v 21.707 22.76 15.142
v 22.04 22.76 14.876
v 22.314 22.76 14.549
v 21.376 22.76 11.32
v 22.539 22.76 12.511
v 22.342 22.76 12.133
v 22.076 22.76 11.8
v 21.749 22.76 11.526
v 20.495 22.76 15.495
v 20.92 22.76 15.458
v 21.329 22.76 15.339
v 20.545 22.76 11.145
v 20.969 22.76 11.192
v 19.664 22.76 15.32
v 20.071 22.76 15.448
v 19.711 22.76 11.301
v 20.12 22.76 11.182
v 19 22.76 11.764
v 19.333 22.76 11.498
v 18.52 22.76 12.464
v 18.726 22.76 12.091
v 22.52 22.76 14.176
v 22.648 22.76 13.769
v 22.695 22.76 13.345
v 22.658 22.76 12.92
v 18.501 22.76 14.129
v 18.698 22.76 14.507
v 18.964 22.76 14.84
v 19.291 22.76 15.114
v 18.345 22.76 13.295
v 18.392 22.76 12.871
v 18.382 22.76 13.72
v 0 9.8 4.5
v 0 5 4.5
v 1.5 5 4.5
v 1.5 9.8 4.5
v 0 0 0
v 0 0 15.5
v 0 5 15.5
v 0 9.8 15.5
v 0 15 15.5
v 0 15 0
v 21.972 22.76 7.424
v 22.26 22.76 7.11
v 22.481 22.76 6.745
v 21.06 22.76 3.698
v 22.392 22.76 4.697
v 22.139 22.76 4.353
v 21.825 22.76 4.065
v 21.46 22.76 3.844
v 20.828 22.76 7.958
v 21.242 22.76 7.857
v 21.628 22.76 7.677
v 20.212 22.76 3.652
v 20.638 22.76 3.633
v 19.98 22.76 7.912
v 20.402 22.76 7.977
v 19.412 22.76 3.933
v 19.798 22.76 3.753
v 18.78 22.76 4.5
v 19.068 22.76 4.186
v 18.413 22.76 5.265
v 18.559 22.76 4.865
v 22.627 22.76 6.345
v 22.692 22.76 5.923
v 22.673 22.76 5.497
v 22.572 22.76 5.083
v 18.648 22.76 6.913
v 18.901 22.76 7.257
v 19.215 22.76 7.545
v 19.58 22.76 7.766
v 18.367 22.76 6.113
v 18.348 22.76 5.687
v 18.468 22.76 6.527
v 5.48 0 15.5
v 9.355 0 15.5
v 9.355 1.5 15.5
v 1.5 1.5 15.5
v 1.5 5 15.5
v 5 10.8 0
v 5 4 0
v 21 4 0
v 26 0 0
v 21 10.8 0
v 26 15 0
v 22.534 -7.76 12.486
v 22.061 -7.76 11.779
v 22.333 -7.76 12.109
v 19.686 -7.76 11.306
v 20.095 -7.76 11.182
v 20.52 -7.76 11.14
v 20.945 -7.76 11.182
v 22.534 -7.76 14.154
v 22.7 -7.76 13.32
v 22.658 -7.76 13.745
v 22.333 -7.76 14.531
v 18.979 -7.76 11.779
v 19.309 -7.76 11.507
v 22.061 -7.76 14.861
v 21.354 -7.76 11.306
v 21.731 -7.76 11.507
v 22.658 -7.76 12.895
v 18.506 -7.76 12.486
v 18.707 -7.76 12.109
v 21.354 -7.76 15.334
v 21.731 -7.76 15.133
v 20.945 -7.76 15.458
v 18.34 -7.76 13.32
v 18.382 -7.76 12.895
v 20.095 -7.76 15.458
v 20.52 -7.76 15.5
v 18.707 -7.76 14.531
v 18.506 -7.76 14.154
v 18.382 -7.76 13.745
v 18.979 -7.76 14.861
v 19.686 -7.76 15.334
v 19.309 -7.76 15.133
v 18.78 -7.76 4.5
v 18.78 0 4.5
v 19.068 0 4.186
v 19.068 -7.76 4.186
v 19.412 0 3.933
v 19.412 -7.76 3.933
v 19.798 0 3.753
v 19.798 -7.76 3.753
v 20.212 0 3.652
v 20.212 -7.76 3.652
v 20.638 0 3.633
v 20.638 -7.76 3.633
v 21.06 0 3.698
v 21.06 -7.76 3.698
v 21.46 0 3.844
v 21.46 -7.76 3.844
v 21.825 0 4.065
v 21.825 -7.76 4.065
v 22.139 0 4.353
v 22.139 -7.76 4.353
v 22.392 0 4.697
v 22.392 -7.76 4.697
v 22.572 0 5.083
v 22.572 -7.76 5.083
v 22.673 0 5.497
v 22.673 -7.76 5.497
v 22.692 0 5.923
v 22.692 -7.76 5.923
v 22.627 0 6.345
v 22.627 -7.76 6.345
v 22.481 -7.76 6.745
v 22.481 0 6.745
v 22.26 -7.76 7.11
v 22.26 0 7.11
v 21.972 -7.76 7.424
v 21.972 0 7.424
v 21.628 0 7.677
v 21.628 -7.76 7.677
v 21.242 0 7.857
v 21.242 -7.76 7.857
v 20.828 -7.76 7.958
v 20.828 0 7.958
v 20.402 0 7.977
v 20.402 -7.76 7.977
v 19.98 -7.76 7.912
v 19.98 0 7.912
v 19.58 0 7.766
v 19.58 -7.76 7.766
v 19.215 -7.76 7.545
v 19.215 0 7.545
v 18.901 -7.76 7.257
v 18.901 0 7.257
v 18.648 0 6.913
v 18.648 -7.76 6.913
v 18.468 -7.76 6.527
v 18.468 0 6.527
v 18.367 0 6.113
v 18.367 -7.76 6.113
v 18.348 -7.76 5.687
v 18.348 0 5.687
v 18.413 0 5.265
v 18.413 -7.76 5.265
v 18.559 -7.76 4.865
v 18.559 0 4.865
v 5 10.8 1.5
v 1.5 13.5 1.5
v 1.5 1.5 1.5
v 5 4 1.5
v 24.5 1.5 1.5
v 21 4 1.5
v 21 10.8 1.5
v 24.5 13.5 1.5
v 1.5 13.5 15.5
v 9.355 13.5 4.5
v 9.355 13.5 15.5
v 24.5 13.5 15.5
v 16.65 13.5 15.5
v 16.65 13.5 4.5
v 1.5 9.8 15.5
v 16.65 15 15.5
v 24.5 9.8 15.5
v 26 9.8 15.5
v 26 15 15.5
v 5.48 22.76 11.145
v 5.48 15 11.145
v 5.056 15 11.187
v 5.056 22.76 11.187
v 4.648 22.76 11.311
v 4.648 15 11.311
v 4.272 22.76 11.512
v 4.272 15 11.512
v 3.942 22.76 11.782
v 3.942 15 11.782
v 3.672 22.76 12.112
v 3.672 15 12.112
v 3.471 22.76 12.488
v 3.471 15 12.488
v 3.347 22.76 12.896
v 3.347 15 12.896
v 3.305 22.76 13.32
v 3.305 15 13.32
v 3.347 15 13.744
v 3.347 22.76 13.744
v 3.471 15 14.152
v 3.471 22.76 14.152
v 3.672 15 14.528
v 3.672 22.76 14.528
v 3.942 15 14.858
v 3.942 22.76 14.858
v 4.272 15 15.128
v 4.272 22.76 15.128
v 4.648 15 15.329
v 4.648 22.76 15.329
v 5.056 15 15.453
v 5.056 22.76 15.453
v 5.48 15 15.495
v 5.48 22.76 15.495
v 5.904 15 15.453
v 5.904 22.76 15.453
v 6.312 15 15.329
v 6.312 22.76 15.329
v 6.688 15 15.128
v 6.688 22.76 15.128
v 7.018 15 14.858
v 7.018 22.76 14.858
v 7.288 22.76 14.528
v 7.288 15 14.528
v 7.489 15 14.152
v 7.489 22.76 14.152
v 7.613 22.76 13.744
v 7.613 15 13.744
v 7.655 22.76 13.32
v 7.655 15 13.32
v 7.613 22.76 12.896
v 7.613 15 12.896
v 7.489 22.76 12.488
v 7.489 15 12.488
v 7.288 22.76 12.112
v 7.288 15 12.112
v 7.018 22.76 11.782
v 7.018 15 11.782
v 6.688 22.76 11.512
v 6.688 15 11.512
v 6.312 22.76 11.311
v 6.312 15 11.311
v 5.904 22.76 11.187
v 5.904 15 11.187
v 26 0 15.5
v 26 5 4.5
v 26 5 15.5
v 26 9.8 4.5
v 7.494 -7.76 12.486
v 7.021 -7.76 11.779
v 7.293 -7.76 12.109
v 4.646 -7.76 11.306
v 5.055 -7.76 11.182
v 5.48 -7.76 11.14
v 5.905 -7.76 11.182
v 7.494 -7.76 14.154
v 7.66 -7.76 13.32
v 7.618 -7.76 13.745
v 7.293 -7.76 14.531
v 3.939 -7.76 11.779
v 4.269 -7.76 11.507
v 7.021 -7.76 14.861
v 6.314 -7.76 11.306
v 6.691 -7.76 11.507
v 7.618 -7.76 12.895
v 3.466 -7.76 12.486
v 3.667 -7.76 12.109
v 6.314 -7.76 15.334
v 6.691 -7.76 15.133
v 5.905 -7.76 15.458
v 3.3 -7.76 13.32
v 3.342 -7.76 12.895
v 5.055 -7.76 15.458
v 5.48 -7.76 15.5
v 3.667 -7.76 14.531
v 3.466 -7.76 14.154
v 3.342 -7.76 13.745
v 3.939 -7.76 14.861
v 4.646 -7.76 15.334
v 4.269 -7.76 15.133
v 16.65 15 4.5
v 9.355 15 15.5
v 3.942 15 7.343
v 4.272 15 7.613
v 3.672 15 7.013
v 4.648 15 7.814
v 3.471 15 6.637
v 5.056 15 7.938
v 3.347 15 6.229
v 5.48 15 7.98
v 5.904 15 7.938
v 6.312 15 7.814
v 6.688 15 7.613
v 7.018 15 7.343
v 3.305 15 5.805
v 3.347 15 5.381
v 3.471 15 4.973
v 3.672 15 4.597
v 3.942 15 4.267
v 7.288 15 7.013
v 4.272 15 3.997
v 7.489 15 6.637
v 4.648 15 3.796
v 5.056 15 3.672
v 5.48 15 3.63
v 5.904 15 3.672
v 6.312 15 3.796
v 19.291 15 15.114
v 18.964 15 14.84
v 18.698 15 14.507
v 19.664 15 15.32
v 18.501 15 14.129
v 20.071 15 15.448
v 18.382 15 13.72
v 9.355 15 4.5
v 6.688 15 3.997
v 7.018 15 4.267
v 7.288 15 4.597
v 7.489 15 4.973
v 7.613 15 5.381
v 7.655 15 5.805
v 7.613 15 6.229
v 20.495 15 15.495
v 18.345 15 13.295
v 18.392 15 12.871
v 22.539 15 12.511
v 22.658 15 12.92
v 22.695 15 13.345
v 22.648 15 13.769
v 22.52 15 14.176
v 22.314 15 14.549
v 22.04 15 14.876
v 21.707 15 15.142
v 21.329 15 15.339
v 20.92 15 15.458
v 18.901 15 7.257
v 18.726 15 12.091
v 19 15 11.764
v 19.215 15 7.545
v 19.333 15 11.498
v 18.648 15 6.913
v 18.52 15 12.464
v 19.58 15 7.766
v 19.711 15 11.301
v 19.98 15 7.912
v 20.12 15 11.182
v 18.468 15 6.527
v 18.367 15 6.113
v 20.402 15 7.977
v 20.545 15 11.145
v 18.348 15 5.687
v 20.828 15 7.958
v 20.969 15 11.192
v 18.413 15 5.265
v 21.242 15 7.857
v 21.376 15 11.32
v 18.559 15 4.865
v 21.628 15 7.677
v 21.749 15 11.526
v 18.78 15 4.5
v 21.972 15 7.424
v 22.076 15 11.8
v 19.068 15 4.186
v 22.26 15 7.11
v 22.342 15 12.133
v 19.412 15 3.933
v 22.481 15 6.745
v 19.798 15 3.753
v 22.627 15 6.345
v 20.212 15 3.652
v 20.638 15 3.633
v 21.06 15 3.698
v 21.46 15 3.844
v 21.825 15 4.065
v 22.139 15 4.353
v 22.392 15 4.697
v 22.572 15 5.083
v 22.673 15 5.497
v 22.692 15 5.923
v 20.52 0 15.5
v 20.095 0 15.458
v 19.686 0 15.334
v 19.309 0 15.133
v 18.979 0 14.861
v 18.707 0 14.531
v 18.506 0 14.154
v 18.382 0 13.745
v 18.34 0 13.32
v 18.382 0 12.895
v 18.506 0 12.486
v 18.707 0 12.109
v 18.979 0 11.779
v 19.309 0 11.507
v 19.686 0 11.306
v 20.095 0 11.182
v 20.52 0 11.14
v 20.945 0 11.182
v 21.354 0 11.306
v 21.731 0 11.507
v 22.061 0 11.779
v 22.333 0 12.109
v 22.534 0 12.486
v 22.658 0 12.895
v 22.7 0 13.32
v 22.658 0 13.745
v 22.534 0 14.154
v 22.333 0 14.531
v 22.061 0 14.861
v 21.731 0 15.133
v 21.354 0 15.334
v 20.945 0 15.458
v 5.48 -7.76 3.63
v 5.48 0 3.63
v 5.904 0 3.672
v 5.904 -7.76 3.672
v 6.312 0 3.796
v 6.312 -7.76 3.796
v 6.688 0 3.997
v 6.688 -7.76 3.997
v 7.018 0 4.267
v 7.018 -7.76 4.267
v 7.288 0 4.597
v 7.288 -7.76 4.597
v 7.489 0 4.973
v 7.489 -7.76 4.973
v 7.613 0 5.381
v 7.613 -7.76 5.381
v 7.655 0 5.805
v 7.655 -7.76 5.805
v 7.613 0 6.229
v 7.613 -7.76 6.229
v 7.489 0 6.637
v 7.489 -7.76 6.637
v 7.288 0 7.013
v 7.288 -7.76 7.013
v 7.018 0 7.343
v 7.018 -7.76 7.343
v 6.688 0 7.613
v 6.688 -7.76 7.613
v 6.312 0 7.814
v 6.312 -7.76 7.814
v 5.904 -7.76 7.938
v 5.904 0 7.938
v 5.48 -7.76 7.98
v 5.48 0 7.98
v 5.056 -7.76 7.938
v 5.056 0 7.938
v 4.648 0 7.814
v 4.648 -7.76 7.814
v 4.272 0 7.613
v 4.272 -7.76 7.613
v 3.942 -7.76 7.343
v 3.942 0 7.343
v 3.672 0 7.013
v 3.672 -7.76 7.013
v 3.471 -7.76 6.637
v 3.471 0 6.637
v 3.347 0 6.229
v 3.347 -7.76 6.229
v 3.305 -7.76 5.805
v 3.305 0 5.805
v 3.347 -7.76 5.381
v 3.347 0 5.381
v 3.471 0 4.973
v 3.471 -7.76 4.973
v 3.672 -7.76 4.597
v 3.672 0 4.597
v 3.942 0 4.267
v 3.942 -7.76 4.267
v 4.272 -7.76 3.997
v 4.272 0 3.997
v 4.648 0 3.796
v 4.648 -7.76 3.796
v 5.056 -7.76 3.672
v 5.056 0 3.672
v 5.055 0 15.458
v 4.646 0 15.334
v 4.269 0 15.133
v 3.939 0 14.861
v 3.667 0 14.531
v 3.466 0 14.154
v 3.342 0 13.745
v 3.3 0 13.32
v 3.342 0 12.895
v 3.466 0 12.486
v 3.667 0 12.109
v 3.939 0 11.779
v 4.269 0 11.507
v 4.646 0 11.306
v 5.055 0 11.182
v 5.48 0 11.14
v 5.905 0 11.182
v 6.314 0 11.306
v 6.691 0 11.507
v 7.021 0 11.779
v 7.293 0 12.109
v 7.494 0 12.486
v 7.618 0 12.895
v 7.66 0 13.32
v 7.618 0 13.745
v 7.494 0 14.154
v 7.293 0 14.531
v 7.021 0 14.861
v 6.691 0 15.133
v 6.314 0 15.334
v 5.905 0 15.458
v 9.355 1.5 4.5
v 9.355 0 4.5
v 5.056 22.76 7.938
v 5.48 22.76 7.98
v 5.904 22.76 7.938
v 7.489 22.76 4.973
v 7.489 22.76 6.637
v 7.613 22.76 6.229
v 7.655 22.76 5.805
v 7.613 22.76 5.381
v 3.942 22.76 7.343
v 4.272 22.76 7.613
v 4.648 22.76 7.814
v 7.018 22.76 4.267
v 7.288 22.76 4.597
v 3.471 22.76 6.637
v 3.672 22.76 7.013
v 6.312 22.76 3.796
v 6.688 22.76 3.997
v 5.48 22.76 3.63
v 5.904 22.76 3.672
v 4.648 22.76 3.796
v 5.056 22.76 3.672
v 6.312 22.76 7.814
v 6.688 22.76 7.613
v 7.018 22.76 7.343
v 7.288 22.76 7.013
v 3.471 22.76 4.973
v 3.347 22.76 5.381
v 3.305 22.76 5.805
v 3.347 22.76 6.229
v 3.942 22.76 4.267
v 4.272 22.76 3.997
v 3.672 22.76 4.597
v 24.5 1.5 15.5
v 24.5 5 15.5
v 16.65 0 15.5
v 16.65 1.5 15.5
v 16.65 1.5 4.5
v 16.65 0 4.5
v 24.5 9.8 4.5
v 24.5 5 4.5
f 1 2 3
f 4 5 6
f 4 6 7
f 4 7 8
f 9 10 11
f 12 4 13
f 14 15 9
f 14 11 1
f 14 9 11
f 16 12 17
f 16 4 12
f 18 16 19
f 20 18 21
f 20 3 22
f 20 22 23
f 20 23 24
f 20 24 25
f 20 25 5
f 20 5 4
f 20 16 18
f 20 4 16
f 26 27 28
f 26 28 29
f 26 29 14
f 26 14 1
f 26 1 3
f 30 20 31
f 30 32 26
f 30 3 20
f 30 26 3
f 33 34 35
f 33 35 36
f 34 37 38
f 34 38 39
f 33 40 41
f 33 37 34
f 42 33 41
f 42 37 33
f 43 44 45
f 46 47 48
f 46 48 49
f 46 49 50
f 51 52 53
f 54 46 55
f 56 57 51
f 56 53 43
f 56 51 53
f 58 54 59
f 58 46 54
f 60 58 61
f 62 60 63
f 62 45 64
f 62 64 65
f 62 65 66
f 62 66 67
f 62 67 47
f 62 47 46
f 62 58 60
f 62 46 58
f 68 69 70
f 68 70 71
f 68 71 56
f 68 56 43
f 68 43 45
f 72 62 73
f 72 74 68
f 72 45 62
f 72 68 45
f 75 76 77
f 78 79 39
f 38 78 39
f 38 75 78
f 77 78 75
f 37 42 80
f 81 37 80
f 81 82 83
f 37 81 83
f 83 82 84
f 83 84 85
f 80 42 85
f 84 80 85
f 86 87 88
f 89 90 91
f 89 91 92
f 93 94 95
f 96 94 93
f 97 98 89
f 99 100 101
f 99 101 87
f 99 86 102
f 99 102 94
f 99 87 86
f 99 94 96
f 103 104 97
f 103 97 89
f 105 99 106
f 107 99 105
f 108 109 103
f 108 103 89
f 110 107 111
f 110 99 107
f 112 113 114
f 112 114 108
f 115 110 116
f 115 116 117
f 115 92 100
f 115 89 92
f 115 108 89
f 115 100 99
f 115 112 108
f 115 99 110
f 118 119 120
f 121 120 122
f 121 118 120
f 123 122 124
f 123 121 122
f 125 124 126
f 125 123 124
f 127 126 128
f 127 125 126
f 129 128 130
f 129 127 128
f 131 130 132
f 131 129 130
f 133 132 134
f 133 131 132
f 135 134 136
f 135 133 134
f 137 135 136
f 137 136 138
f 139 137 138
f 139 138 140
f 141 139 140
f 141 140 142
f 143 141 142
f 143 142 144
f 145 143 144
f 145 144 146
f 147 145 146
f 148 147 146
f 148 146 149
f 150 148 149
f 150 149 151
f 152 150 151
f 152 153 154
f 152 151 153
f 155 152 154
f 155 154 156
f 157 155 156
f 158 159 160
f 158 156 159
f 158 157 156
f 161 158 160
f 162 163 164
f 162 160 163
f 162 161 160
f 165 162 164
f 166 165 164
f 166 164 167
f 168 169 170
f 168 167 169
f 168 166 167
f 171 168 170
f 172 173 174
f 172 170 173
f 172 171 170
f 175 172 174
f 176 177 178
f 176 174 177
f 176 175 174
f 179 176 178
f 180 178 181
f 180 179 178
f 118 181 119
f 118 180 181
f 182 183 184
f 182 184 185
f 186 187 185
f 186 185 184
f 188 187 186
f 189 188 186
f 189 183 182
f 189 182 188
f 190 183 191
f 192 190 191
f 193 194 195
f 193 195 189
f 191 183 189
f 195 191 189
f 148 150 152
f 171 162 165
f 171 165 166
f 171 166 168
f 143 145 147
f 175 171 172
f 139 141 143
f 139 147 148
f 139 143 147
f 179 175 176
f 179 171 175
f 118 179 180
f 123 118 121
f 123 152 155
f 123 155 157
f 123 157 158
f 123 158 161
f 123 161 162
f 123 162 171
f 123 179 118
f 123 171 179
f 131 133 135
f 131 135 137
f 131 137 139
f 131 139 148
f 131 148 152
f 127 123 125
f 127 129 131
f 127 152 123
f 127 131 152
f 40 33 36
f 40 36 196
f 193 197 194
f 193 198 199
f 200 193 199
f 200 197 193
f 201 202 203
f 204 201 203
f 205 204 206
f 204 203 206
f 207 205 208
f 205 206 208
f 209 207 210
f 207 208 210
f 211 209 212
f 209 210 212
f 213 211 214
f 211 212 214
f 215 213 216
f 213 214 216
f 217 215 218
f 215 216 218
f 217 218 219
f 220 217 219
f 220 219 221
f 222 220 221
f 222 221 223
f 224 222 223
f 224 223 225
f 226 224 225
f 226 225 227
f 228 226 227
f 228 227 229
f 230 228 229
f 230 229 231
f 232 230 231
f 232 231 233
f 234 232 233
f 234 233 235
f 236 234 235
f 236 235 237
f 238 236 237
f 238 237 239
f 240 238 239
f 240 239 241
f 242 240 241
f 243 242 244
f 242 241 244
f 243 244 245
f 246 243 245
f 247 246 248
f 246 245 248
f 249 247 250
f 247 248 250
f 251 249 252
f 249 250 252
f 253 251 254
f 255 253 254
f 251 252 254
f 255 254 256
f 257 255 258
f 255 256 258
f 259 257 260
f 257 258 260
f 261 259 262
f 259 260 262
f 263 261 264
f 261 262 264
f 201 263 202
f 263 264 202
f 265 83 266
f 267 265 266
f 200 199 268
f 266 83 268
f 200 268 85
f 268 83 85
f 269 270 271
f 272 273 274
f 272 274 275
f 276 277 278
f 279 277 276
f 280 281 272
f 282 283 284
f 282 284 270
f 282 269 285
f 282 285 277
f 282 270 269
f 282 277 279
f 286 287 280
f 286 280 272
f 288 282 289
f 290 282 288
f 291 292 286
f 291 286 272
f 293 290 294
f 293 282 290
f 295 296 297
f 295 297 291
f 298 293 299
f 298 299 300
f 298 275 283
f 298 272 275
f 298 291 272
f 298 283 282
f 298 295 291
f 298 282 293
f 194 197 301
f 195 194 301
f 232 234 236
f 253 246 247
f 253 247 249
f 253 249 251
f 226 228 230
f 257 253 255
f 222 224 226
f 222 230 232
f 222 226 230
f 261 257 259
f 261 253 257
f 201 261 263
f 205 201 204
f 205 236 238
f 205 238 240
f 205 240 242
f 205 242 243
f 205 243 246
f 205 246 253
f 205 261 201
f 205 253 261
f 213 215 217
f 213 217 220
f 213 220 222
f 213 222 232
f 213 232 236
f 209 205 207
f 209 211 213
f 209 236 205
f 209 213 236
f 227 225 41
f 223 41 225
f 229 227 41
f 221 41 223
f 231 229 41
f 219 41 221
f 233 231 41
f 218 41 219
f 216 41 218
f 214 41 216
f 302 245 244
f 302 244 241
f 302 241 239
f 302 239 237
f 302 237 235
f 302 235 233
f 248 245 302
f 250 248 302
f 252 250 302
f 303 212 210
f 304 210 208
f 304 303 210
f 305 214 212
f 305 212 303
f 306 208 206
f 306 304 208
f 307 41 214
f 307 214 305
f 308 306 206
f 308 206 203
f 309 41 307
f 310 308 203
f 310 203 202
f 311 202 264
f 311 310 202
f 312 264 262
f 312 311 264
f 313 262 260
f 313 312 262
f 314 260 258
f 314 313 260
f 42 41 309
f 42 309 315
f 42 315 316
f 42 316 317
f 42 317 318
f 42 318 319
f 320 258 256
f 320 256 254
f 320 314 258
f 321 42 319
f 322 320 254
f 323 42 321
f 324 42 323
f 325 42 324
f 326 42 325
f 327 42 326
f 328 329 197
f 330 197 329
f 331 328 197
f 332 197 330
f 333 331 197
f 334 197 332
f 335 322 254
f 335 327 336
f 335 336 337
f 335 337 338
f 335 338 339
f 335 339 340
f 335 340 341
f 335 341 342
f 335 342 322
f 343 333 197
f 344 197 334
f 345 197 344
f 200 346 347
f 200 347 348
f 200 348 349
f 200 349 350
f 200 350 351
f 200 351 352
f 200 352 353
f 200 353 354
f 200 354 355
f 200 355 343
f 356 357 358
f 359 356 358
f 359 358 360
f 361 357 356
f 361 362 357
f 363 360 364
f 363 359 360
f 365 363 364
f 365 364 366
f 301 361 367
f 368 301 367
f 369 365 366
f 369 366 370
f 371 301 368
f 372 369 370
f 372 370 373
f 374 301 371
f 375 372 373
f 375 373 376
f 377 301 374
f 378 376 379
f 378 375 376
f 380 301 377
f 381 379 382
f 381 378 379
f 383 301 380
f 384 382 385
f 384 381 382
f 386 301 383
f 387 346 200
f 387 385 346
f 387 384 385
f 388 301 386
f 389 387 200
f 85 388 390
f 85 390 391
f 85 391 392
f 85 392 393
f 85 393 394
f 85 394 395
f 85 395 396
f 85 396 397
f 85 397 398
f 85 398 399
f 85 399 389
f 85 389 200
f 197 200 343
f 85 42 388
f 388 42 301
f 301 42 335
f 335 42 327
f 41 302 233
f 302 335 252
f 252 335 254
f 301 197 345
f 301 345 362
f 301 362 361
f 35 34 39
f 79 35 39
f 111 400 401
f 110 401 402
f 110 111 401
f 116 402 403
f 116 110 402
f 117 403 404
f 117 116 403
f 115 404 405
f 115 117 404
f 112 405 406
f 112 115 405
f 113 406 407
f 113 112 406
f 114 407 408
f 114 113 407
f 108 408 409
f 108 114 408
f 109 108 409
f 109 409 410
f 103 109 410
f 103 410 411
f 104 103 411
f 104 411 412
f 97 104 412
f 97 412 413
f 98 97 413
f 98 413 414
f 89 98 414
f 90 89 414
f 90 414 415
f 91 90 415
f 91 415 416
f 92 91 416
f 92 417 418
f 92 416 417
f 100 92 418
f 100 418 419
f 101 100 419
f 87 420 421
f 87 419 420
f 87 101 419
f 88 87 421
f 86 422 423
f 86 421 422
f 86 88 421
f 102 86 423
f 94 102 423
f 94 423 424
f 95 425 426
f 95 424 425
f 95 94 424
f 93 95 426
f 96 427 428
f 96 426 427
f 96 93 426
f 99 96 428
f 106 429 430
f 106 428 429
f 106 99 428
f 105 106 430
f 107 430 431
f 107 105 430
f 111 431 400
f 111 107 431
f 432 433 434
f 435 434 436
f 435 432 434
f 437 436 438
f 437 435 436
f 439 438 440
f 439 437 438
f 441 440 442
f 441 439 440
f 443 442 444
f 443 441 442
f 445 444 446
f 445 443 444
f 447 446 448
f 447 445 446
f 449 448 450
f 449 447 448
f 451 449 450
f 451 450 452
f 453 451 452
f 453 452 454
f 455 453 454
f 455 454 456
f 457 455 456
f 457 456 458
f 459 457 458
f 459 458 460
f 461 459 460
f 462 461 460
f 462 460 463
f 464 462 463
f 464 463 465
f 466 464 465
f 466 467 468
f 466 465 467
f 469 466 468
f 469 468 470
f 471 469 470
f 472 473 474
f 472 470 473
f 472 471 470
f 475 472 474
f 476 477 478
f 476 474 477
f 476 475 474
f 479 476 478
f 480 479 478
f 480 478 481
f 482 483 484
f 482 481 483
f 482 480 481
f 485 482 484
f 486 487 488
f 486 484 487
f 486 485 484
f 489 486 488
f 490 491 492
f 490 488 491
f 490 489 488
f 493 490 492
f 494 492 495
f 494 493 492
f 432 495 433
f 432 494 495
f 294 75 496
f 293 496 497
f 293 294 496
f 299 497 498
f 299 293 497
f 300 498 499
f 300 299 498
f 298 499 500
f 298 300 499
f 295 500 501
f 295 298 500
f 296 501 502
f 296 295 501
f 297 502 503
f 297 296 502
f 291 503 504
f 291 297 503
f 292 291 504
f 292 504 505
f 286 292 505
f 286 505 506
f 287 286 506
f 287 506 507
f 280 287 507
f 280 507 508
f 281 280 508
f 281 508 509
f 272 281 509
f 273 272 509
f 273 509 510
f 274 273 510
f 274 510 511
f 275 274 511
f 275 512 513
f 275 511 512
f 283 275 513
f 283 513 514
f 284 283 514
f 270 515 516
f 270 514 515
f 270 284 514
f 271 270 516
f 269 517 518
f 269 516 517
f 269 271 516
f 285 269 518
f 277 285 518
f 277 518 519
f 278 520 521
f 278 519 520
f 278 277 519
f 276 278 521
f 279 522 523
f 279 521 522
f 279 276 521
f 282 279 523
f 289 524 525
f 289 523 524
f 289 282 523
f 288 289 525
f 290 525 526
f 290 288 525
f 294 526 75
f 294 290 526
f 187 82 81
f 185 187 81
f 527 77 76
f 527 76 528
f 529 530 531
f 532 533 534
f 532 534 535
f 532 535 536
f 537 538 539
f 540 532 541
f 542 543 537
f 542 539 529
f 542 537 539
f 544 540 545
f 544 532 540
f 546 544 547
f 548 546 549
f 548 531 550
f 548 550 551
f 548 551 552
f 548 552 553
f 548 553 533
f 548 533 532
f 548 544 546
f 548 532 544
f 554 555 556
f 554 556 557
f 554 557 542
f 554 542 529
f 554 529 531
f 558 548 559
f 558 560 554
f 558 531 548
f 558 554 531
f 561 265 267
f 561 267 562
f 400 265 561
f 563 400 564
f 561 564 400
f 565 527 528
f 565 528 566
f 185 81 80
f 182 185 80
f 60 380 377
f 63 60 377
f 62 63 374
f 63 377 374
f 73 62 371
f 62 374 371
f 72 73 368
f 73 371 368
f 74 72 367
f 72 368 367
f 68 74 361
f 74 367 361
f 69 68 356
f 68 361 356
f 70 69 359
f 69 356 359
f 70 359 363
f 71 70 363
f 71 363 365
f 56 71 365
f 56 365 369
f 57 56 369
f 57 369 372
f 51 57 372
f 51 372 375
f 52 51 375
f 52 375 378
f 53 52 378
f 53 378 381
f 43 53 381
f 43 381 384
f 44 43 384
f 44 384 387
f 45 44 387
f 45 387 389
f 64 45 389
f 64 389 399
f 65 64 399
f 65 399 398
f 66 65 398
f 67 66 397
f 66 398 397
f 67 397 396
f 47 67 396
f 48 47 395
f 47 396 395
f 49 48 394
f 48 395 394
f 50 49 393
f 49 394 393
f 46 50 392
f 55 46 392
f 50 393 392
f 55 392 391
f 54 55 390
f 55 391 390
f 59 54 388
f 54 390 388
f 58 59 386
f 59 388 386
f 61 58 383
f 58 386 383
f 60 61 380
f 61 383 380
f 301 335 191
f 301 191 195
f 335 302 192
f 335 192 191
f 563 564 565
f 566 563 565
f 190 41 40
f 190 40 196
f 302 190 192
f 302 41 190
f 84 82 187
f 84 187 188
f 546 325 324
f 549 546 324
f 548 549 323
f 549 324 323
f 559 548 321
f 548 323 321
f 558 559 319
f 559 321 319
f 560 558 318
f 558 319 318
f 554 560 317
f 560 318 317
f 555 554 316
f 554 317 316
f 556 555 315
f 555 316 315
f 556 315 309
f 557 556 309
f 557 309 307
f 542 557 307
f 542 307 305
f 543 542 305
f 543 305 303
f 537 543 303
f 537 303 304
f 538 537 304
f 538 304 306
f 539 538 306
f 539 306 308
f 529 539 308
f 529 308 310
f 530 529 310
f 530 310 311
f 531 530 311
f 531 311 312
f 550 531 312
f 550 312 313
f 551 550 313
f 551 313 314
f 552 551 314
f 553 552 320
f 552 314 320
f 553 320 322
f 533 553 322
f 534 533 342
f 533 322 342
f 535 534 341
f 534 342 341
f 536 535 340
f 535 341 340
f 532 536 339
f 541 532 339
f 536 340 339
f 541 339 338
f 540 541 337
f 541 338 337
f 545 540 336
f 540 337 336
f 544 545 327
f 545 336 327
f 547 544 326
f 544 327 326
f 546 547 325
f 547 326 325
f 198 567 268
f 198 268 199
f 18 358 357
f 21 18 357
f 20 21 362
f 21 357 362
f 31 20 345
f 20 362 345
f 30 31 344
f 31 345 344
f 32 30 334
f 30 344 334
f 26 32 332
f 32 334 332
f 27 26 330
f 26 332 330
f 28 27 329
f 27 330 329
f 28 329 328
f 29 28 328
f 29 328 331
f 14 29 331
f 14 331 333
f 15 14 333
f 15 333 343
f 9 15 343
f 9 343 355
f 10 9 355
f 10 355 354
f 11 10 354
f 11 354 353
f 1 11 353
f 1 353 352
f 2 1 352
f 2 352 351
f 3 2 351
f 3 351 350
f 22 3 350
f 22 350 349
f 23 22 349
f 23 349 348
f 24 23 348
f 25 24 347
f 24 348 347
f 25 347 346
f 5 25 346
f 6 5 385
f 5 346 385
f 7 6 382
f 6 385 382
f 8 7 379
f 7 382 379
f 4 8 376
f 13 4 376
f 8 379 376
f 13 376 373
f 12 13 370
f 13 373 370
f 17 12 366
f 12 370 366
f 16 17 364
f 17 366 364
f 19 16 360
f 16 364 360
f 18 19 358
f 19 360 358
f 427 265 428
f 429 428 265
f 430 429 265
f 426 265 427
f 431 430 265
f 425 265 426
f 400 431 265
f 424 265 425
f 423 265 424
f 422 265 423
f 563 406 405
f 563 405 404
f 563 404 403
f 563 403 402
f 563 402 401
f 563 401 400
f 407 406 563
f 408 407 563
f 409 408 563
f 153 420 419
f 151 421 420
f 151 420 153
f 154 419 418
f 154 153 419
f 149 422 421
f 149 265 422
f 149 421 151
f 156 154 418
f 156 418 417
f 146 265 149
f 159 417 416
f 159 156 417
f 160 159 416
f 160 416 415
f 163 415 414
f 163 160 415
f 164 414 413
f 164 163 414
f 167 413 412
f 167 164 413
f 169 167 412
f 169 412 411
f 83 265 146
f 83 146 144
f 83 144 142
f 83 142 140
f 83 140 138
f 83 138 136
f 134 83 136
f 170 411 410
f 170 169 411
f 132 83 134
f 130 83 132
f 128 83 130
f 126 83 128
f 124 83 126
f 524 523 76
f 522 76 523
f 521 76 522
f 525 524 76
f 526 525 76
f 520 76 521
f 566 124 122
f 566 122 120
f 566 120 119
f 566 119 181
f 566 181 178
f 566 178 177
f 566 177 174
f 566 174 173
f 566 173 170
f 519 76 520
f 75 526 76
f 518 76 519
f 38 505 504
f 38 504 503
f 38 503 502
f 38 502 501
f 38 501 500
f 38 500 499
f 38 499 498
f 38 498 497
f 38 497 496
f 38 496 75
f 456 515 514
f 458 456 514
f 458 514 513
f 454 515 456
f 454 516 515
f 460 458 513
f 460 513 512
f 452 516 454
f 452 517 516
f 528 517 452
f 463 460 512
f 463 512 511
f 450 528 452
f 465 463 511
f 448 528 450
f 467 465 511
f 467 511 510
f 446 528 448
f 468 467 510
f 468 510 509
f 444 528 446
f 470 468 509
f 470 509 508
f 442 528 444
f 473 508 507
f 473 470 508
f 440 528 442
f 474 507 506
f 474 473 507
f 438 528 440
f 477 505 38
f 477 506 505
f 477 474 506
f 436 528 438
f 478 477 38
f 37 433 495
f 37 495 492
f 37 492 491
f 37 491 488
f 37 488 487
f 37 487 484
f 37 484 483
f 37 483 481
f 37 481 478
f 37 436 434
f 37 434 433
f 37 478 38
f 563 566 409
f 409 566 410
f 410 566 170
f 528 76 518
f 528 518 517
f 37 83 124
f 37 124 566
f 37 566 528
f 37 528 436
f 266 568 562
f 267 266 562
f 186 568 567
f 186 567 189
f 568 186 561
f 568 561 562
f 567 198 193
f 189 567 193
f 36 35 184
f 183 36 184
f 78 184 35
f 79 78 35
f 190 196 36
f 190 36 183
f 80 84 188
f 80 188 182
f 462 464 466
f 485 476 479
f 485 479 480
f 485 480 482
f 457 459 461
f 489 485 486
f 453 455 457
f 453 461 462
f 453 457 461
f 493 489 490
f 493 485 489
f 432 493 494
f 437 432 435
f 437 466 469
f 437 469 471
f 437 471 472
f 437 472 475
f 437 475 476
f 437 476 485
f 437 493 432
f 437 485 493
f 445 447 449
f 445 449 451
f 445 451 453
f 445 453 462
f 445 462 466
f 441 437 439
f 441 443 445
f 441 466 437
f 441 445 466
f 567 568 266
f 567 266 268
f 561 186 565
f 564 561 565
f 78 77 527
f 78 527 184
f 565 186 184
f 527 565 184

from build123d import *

# Parameters (mm, degrees)
SKETCH1_W           = 26
SKETCH1_H           = 15
BOSS_EXTRUDE1_DEPTH = 17.4
SKETCH3_W           = 23
SKETCH3_H           = 12
CUT_EXTRUDE1_DEPTH  = 15.9
SKETCH5_W           = 12
SKETCH5_H           = 12.9
CUT_EXTRUDE2_DEPTH  = 15.9
SKETCH8_W           = 12.9
SKETCH8_H           = 4.8
CUT_EXTRUDE4_DEPTH  = 1000
SKETCH9_W           = 16
SKETCH9_H           = 6.8
CUT_EXTRUDE5_DEPTH  = 1000
SKETCH10_W          = 1.9
SKETCH10_H          = 15
CUT_EXTRUDE6_DEPTH  = 1000
SKETCH11_R          = 2.175
BOSS_EXTRUDE2_DEPTH = 7.76
BOSS_EXTRUDE3_START = 7.76
SKETCH12_R          = 2.175
SKETCH12_R_2        = 2.18
BOSS_EXTRUDE3_DEPTH = 7.76
SKETCH13_W          = 12
SKETCH13_H          = 11
BOSS_EXTRUDE5_DEPTH = 1.5
SKETCH14_W          = 12
SKETCH14_H          = 11
BOSS_EXTRUDE6_DEPTH = 1.5
SKETCH17_W          = 7.294957973
SKETCH17_H          = 11
CUT_EXTRUDE7_DEPTH  = 50


with BuildPart() as part:
    # Sketch1 → Boss-Extrude1 (new body)
    with BuildSketch(Plane.XY):
        with Locations((13, 7.5)):
            Rectangle(SKETCH1_W, SKETCH1_H)
    extrude(amount=BOSS_EXTRUDE1_DEPTH)

    # Sketch3 → Cut-Extrude1 (cut)
    with BuildSketch(Plane.XY.offset(17.4)):
        with Locations((13, 7.5)):
            Rectangle(SKETCH3_W, SKETCH3_H)
    extrude(amount=-CUT_EXTRUDE1_DEPTH, mode=Mode.SUBTRACT)

    # Sketch5 → Cut-Extrude2 (cut)
    with BuildSketch(Plane.XZ):
        with Locations((13, 10.95)):
            Rectangle(SKETCH5_W, SKETCH5_H)
    extrude(amount=-CUT_EXTRUDE2_DEPTH, mode=Mode.SUBTRACT)

    # Sketch8 → Cut-Extrude4 (cut)
    with BuildSketch(Plane.ZY):
        with Locations((10.95, 7.4)):
            Rectangle(SKETCH8_W, SKETCH8_H)
    extrude(amount=-CUT_EXTRUDE4_DEPTH, mode=Mode.SUBTRACT)

    # Sketch9 → Cut-Extrude5 (cut)
    with BuildSketch(Plane(origin=(0, 0, 0), x_dir=(-1, 0, 0), z_dir=(0, 0, -1))):
        with Locations((-13, 7.4)):
            Rectangle(SKETCH9_W, SKETCH9_H)
    extrude(amount=-CUT_EXTRUDE5_DEPTH, mode=Mode.SUBTRACT)

    # Sketch10 → Cut-Extrude6 (cut)
    with BuildSketch(Plane.ZY):
        with Locations((16.45, 7.5)):
            Rectangle(SKETCH10_W, SKETCH10_H)
    extrude(amount=-CUT_EXTRUDE6_DEPTH, mode=Mode.SUBTRACT)

    # Sketch11 → Boss-Extrude2 (add)
    with BuildSketch(Plane(origin=(0, 15, 0), x_dir=(1, 0, 0), z_dir=(0, 1, 0))):
        with Locations(Location((20.52, -5.805, 0), (0, 0, 143.130102354))):
            Circle(SKETCH11_R)
        with Locations(Location((20.52, -13.32, 0), (0, 0, 134.33485804))):
            Circle(SKETCH11_R)
        with Locations(Location((5.48, -5.805, 0), (0, 0, 90))):
            Circle(SKETCH11_R)
        with Locations(Location((5.48, -13.32, 0), (0, 0, 90))):
            Circle(SKETCH11_R)
    extrude(amount=BOSS_EXTRUDE2_DEPTH)

    # Sketch12 → Boss-Extrude3 (add)
    with BuildSketch(Plane(origin=(0, 0, 0), x_dir=(-1, 0, 0), z_dir=(0, -1, 0)).offset(BOSS_EXTRUDE3_START)):
        with Locations(Location((-5.48, -5.805, 0), (0, 0, 90))):
            Circle(SKETCH12_R)
        with Locations(Location((-5.48, -13.32, 0), (0, 0, 270))):
            Circle(SKETCH12_R_2)
        with Locations(Location((-20.52, -5.805, 0), (0, 0, 36.869897646))):
            Circle(SKETCH12_R)
        with Locations(Location((-20.52, -13.32, 0), (0, 0, 270))):
            Circle(SKETCH12_R_2)
    extrude(amount=-BOSS_EXTRUDE3_DEPTH)

    # Sketch13 → Boss-Extrude5 (add)
    with BuildSketch(Plane(origin=(0, 15, 0), x_dir=(1, 0, 0), z_dir=(0, 1, 0))):
        with Locations((13, -10)):
            Rectangle(SKETCH13_W, SKETCH13_H)
    extrude(amount=-BOSS_EXTRUDE5_DEPTH)

    # Sketch14 → Boss-Extrude6 (add)
    with BuildSketch(Plane(origin=(0, 0, 0), x_dir=(-1, 0, 0), z_dir=(0, -1, 0))):
        with Locations((-13, -10)):
            Rectangle(SKETCH14_W, SKETCH14_H)
    extrude(amount=-BOSS_EXTRUDE6_DEPTH)

    # Sketch17 → Cut-Extrude7 (cut)
    with BuildSketch(Plane(origin=(0, 15, 0), x_dir=(1, 0, 0), z_dir=(0, 1, 0))):
        with Locations((13.002478986, -10)):
            Rectangle(SKETCH17_W, SKETCH17_H)
    extrude(amount=-CUT_EXTRUDE7_DEPTH, mode=Mode.SUBTRACT)


solid = part.part
